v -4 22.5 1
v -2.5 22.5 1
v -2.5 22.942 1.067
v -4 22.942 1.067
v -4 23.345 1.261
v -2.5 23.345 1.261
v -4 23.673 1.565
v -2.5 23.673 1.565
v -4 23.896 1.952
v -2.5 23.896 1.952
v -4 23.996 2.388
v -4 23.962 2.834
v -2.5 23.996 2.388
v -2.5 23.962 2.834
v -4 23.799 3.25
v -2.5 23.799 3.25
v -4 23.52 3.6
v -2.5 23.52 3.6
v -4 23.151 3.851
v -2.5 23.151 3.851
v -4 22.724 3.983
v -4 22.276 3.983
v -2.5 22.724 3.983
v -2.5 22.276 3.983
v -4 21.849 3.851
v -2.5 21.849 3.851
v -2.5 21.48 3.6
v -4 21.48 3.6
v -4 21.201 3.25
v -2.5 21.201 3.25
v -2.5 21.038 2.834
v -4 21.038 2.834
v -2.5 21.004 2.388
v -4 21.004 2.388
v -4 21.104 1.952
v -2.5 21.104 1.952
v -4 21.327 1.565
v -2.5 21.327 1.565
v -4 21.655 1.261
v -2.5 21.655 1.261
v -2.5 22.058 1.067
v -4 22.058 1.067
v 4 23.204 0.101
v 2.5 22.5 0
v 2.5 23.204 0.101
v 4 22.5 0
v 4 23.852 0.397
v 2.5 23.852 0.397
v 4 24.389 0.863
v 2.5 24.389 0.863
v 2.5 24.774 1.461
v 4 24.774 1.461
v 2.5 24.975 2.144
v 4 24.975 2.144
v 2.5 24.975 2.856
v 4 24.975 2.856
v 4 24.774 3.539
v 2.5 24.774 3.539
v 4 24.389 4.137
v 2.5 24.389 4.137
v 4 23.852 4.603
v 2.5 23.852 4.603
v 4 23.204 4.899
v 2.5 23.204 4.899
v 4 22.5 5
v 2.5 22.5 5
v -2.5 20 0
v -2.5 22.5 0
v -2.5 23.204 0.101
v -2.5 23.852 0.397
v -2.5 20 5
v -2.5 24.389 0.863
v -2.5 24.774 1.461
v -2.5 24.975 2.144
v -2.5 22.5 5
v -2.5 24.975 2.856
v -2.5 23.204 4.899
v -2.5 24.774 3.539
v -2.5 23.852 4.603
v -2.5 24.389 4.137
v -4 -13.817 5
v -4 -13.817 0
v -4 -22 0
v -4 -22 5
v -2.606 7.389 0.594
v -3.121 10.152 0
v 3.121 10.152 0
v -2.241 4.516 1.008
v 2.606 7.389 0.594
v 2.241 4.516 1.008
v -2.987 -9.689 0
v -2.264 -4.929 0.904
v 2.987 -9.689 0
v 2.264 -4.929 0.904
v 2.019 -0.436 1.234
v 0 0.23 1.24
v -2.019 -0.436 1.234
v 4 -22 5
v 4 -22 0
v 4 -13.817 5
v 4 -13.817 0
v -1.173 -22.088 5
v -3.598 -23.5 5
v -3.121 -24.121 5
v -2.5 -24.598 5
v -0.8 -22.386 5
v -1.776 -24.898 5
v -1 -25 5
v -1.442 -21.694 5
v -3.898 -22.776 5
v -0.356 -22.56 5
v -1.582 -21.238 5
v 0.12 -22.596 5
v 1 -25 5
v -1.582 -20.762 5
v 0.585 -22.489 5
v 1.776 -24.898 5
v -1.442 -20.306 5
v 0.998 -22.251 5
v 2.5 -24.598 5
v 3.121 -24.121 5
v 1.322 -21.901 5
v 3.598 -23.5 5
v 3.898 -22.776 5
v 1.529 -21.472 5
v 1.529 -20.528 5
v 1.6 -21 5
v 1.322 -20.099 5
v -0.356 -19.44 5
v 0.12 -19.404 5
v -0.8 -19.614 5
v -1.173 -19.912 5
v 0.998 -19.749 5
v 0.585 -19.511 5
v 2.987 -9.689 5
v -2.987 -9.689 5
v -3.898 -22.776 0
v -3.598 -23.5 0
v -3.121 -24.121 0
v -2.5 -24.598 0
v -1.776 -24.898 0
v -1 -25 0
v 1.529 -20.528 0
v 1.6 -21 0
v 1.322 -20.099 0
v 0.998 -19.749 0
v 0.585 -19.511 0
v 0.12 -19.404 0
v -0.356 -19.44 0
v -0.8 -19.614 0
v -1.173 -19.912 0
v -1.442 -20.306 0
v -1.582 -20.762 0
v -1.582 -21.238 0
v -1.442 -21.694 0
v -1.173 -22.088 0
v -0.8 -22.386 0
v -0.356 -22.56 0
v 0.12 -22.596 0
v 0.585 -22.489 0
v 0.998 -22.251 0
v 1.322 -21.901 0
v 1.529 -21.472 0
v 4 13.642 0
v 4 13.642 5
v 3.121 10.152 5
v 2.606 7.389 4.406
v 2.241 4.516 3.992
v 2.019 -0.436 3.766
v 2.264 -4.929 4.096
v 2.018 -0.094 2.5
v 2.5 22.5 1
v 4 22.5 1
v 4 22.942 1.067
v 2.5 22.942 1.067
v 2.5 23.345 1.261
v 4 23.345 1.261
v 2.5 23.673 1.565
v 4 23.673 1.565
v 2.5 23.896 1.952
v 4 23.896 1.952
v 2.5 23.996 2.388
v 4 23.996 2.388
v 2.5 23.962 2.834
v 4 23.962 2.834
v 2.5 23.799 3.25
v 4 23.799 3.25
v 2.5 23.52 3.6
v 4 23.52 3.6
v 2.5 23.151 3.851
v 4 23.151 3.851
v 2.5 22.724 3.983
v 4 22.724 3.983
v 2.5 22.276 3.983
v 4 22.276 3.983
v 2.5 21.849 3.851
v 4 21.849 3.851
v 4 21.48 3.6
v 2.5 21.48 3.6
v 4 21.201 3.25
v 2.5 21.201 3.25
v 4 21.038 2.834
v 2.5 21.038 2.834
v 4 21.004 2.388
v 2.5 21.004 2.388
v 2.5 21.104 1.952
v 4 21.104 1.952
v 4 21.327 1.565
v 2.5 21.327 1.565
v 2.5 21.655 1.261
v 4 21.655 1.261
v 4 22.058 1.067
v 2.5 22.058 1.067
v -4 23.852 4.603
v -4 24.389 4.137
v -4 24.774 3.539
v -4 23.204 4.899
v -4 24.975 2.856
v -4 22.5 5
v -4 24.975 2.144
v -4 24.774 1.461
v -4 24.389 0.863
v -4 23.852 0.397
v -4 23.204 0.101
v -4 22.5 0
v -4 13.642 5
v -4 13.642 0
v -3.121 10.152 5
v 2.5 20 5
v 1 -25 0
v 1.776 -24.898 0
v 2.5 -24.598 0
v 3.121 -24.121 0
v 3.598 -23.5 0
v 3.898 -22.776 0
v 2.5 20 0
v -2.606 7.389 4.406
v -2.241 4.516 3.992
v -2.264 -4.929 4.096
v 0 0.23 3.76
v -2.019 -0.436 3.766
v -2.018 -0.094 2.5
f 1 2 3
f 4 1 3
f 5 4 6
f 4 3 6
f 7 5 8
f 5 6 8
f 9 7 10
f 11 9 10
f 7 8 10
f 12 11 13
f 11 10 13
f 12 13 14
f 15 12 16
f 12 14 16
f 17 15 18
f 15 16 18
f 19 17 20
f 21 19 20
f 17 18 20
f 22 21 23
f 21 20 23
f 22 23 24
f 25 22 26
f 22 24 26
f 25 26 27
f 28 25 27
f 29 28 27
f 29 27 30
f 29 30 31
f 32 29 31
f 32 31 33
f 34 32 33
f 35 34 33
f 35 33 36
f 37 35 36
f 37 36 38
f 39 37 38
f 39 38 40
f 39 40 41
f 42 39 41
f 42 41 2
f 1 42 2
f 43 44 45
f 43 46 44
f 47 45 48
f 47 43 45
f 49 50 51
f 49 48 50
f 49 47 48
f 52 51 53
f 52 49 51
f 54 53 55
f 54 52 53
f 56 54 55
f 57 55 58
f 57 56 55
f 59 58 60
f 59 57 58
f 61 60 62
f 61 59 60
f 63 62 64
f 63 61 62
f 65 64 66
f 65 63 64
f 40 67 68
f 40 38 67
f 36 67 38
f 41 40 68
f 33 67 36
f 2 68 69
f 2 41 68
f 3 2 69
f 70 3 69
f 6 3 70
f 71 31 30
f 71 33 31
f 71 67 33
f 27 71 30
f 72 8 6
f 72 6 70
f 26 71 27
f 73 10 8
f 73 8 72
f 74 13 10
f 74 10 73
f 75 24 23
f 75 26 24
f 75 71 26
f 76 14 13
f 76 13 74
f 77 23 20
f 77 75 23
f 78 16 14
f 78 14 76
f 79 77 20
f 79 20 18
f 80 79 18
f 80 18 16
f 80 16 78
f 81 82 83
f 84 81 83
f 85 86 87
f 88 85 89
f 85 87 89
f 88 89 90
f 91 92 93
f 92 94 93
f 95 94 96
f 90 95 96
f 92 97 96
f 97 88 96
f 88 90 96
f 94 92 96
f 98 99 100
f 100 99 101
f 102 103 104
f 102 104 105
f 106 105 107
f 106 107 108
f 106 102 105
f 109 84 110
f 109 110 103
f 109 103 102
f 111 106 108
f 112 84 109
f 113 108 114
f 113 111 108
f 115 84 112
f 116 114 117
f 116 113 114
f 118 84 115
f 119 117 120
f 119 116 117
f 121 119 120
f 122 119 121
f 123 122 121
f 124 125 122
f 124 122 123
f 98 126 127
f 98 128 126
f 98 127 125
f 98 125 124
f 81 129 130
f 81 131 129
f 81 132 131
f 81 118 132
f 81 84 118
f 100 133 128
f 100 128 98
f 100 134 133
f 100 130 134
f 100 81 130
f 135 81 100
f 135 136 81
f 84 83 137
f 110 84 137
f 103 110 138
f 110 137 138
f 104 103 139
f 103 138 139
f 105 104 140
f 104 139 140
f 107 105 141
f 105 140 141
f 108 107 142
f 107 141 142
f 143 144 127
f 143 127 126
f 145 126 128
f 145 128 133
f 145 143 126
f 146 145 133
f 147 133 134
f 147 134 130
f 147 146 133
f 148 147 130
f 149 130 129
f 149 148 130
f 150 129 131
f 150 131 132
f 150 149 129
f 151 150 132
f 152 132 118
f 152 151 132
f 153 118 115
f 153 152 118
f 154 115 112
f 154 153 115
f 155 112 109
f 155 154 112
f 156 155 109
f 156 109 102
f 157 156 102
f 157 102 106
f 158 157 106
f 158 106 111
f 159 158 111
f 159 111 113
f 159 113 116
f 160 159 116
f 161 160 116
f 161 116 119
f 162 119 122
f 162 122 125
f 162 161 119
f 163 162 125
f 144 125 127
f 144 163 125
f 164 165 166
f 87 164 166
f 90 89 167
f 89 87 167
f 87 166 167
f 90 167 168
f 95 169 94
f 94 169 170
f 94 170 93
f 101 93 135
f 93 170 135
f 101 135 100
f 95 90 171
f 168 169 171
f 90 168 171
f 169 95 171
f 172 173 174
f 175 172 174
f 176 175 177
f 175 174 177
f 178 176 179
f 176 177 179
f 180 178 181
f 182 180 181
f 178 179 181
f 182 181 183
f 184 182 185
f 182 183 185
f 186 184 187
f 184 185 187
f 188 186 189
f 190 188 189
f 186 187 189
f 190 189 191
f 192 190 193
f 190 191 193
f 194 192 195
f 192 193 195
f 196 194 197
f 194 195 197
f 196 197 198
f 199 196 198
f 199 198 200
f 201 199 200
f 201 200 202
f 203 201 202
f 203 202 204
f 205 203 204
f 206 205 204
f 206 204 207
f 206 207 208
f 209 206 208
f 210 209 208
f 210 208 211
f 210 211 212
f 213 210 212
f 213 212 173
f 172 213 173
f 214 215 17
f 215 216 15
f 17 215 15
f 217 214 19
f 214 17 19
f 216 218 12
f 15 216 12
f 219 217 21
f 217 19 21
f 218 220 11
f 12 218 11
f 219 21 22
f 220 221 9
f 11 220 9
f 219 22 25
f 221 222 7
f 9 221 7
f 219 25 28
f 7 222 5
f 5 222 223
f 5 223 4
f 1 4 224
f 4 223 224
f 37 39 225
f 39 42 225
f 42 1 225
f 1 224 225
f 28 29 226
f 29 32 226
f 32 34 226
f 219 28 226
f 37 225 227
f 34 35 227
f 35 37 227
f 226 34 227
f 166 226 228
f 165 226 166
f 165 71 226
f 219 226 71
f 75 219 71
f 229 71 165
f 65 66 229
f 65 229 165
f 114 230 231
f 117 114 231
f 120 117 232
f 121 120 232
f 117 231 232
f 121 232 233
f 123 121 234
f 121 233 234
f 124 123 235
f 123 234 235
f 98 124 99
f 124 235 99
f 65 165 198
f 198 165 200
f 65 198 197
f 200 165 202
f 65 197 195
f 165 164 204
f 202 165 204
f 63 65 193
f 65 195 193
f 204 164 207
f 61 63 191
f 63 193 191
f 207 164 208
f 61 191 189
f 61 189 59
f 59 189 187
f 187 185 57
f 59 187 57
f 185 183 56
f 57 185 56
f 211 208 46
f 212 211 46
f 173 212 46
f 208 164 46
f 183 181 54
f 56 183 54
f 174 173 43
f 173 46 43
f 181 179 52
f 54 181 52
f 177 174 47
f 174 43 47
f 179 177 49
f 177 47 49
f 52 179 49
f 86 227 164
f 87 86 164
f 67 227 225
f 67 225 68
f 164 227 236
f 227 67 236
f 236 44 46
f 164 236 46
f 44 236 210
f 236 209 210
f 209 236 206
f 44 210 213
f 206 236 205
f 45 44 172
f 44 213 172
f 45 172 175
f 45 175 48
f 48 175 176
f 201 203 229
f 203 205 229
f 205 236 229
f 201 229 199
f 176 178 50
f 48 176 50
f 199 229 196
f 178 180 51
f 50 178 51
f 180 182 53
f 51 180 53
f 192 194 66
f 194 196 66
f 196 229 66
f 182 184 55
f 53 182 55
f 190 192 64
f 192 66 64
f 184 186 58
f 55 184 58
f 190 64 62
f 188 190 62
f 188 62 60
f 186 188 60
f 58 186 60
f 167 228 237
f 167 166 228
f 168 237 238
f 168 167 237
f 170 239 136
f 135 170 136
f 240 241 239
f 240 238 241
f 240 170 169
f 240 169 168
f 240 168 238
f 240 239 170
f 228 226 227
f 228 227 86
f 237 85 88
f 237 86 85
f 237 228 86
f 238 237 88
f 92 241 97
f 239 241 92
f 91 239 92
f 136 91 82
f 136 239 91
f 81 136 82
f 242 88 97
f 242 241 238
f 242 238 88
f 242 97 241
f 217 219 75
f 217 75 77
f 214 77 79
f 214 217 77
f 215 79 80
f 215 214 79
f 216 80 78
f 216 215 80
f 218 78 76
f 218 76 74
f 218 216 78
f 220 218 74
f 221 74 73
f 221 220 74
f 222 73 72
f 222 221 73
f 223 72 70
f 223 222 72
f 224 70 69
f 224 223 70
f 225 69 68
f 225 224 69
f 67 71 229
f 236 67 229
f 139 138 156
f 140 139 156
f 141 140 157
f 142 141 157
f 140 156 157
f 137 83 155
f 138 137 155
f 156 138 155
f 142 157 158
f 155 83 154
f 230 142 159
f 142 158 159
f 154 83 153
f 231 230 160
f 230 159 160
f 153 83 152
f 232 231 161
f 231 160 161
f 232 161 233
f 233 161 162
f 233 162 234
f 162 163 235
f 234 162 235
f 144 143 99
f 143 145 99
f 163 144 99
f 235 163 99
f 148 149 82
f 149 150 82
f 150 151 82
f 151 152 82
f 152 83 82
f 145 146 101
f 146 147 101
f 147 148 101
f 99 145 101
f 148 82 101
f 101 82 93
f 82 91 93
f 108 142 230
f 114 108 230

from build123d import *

# Parameters (mm, degrees)
SKETCH1_R           = 1.6
BOSS_EXTRUDE1_DEPTH = 5
SKETCH2_W           = 5
SKETCH2_H           = 5
CUT_EXTRUDE1_DEPTH  = 11
FILLET4_RADIUS      = 2.5
FILLET4_LENGTH      = 1.5
FILLET5_RADIUS      = 2.5
FILLET5_LENGTH      = 1.5
SKETCH3_R           = 1.5
CUT_EXTRUDE2_DEPTH  = 11
CUT_EXTRUDE3_DEPTH  = 11
CUT_EXTRUDE4_DEPTH  = 11


with BuildPart() as part:
    # Sketch1 → Boss-Extrude1 (new body)
    with BuildSketch(Plane.XY):
        with BuildLine():
            Line((-1, -25), (1, -25))
            ThreePointArc((1, -25), (3.121320344, -24.121320344), (4, -22))
            Line((4, -22), (4, 25))
            Line((4, 25), (-4, 25))
            Line((-4, 25), (-4, -22))
            ThreePointArc((-4, -22), (-3.121320344, -24.121320344), (-1, -25))
        make_face()
        with Locations((0, -21)):
            Circle(SKETCH1_R, mode=Mode.SUBTRACT)
    extrude(amount=BOSS_EXTRUDE1_DEPTH)

    # Sketch2 → Cut-Extrude1 (cut)
    with BuildSketch(Plane.XY.offset(5)):
        with Locations((0, 22.5)):
            Rectangle(SKETCH2_W, SKETCH2_H)
    extrude(amount=-CUT_EXTRUDE1_DEPTH, mode=Mode.SUBTRACT)

    # Fillet4: full round fillet: the end face becomes a half cylinder, R = half its width
    fillet4_face = Plane((-3.25, 25, 2.5), x_dir=(-1, 0, 0), z_dir=(0, 1, 0))  # on the end face: x along it, z out of the body
    fillet4_slab = fillet4_face.offset(-FILLET4_RADIUS / 2) * Box(FILLET4_LENGTH, 2 * FILLET4_RADIUS, FILLET4_RADIUS, mode=Mode.PRIVATE)  # the body's end, R deep
    fillet4_round = Plane((-3.25, 22.5, 2.5), x_dir=(0, 1, 0), z_dir=(-1, 0, 0)) * Cylinder(FILLET4_RADIUS, FILLET4_LENGTH, mode=Mode.PRIVATE)  # its axis R under the face
    add(fillet4_slab - fillet4_round, mode=Mode.SUBTRACT)

    # Fillet5: full round fillet: the end face becomes a half cylinder, R = half its width
    fillet5_face = Plane((3.25, 25, 2.5), x_dir=(1, 0, 0), z_dir=(0, 1, 0))  # on the end face: x along it, z out of the body
    fillet5_slab = fillet5_face.offset(-FILLET5_RADIUS / 2) * Box(FILLET5_LENGTH, 2 * FILLET5_RADIUS, FILLET5_RADIUS, mode=Mode.PRIVATE)  # the body's end, R deep
    fillet5_round = Plane((3.25, 22.5, 2.5), x_dir=(0, 1, 0), z_dir=(1, 0, 0)) * Cylinder(FILLET5_RADIUS, FILLET5_LENGTH, mode=Mode.PRIVATE)  # its axis R under the face
    add(fillet5_slab - fillet5_round, mode=Mode.SUBTRACT)

    # Sketch3 → Cut-Extrude2 (cut)
    with BuildSketch(Plane(origin=(4, 0, 0), x_dir=(0, 0, -1), z_dir=(1, 0, 0))):
        with Locations((-2.5, 22.5)):
            Circle(SKETCH3_R)
    extrude(amount=-CUT_EXTRUDE2_DEPTH, mode=Mode.SUBTRACT)

    # Sketch4 → Cut-Extrude3 (cut)
    with BuildSketch(Plane(origin=(4, 0, 0), x_dir=(0, 0, -1), z_dir=(1, 0, 0))):
        with BuildLine():
            Line((-5.938187825, 13.381747244), (-5.854447702, -12.661430853))
            add(Edge.make_bspline(
                [(-5.938187825, 13.381747244), (-1.624651823, 0.354662238), (-5.854447702, -12.661430853)],
                knots=[0, 0, 0, 1, 1, 1], degree=2))
        make_face()
        with BuildLine():
            Line((0.938187825, 13.381747244), (0.854447702, -12.661430853))
            add(Edge.make_bspline(
                [(0.938187825, 13.381747244), (-3.375348177, 0.354662238), (0.854447702, -12.661430853)],
                knots=[0, 0, 0, 1, 1, 1], degree=2))
        make_face()
    extrude(amount=-CUT_EXTRUDE3_DEPTH, mode=Mode.SUBTRACT)

    # Sketch5 → Cut-Extrude4 (cut)
    with BuildSketch(Plane.XY.offset(5)):
        with BuildLine():
            Line((-5.246369121, -17.605604068), (-4.943693979, 16.596686929))
            add(Edge.make_bspline(
                [(-4.943693979, 16.596686929), (1.055826259, -0.52557817), (-5.246369121, -17.605604068)],
                knots=[0, 0, 0, 1, 1, 1], degree=2))
        make_face()
        with BuildLine():
            Line((5.246369121, -17.605604068), (4.943693979, 16.596686929))
            add(Edge.make_bspline(
                [(4.943693979, 16.596686929), (-1.055826259, -0.52557817), (5.246369121, -17.605604068)],
                knots=[0, 0, 0, 1, 1, 1], degree=2))
        make_face()
    extrude(amount=-CUT_EXTRUDE4_DEPTH, mode=Mode.SUBTRACT)


solid = part.part
